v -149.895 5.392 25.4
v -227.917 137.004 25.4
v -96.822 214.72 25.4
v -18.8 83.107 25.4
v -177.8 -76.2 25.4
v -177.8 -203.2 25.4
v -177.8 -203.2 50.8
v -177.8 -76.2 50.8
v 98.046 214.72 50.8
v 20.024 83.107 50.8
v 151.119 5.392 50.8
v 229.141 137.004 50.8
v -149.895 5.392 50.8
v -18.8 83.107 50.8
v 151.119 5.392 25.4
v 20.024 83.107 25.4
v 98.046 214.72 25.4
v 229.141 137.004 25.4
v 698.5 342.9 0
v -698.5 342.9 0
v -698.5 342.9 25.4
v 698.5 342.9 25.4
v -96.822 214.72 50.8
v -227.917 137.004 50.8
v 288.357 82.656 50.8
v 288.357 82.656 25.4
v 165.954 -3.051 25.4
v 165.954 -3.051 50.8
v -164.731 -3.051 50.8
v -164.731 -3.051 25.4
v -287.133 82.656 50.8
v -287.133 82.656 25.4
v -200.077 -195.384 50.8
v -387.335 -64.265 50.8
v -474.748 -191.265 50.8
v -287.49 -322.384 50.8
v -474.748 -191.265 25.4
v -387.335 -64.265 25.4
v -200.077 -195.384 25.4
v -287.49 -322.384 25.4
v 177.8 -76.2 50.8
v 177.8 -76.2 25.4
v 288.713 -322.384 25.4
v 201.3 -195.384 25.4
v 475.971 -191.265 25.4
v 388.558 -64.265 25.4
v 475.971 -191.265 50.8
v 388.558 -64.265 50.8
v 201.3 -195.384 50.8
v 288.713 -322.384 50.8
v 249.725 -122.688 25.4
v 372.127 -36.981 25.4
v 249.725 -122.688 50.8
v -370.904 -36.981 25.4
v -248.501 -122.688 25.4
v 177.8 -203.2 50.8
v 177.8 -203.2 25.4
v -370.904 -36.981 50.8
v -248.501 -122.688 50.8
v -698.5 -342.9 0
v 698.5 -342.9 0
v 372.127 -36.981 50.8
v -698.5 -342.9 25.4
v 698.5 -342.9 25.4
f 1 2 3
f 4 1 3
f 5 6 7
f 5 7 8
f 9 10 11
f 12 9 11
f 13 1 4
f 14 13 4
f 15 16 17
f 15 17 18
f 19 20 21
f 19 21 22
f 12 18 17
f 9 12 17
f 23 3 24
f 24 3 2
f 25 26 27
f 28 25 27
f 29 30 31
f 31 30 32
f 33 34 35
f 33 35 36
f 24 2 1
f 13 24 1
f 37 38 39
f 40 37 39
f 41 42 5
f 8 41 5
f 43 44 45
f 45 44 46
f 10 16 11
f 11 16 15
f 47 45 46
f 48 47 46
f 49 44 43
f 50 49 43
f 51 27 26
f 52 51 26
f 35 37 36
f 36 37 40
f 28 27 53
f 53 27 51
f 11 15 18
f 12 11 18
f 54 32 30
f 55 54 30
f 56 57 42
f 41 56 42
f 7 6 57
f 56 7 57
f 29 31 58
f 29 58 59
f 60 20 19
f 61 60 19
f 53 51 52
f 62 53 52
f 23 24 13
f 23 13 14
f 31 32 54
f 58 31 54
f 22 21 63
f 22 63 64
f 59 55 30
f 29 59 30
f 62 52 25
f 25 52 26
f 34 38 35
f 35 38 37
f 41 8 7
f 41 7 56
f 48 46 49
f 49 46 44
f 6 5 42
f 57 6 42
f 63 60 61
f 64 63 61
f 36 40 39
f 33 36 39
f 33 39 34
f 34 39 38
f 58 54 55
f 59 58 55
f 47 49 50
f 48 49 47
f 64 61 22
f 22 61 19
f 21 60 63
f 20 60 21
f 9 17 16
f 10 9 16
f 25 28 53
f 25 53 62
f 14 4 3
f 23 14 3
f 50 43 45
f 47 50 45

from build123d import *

# Parameters (mm, degrees)
F0_W     = 1397
F0_H     = 685.8
F1_DEPTH = 25.4
F2_W     = 177.188156
F2_H     = 127
F2_W_2   = 178.411844
F3_DEPTH = 25.4


with BuildPart() as f1:
    # F0 (on Top) → F1 (new body)
    with BuildSketch(Plane.XY):
        Rectangle(F0_W, F0_H)
    extrude(amount=F1_DEPTH)


with BuildPart() as f3:
    # F2 (on face) → F3 (new body)
    with BuildSketch(Plane.XY.offset(25.4)):
        with Locations((89.205922, -139.7)):
            Rectangle(F2_W, F2_H)
        with Locations((-88.594078, -139.7)):
            Rectangle(F2_W_2, F2_H)
        Polygon((-200.076583, -195.384446), (-387.334741, -64.264873), (-474.74779, -191.264873), (-287.489632, -322.384446), align=None)
        Polygon((-164.730564, -3.050945), (-287.132964, 82.656138), (-370.903802, -36.981018), (-248.501402, -122.688101), align=None)
        Polygon((-18.799853, 83.107496), (-96.821829, 214.719962), (-227.917412, 137.004403), (-149.895436, 5.391937), align=None)
        Polygon((229.141099, 137.004403), (98.045517, 214.719962), (20.02354, 83.107496), (151.119123, 5.391937), align=None)
        Polygon((372.12749, -36.981018), (288.356651, 82.656138), (165.954251, -3.050945), (249.72509, -122.688101), align=None)
        Polygon((475.971477, -191.264873), (388.558428, -64.264873), (201.300271, -195.384446), (288.71332, -322.384446), align=None)
    extrude(amount=F3_DEPTH)


solid = Compound([f1.part, f3.part])
